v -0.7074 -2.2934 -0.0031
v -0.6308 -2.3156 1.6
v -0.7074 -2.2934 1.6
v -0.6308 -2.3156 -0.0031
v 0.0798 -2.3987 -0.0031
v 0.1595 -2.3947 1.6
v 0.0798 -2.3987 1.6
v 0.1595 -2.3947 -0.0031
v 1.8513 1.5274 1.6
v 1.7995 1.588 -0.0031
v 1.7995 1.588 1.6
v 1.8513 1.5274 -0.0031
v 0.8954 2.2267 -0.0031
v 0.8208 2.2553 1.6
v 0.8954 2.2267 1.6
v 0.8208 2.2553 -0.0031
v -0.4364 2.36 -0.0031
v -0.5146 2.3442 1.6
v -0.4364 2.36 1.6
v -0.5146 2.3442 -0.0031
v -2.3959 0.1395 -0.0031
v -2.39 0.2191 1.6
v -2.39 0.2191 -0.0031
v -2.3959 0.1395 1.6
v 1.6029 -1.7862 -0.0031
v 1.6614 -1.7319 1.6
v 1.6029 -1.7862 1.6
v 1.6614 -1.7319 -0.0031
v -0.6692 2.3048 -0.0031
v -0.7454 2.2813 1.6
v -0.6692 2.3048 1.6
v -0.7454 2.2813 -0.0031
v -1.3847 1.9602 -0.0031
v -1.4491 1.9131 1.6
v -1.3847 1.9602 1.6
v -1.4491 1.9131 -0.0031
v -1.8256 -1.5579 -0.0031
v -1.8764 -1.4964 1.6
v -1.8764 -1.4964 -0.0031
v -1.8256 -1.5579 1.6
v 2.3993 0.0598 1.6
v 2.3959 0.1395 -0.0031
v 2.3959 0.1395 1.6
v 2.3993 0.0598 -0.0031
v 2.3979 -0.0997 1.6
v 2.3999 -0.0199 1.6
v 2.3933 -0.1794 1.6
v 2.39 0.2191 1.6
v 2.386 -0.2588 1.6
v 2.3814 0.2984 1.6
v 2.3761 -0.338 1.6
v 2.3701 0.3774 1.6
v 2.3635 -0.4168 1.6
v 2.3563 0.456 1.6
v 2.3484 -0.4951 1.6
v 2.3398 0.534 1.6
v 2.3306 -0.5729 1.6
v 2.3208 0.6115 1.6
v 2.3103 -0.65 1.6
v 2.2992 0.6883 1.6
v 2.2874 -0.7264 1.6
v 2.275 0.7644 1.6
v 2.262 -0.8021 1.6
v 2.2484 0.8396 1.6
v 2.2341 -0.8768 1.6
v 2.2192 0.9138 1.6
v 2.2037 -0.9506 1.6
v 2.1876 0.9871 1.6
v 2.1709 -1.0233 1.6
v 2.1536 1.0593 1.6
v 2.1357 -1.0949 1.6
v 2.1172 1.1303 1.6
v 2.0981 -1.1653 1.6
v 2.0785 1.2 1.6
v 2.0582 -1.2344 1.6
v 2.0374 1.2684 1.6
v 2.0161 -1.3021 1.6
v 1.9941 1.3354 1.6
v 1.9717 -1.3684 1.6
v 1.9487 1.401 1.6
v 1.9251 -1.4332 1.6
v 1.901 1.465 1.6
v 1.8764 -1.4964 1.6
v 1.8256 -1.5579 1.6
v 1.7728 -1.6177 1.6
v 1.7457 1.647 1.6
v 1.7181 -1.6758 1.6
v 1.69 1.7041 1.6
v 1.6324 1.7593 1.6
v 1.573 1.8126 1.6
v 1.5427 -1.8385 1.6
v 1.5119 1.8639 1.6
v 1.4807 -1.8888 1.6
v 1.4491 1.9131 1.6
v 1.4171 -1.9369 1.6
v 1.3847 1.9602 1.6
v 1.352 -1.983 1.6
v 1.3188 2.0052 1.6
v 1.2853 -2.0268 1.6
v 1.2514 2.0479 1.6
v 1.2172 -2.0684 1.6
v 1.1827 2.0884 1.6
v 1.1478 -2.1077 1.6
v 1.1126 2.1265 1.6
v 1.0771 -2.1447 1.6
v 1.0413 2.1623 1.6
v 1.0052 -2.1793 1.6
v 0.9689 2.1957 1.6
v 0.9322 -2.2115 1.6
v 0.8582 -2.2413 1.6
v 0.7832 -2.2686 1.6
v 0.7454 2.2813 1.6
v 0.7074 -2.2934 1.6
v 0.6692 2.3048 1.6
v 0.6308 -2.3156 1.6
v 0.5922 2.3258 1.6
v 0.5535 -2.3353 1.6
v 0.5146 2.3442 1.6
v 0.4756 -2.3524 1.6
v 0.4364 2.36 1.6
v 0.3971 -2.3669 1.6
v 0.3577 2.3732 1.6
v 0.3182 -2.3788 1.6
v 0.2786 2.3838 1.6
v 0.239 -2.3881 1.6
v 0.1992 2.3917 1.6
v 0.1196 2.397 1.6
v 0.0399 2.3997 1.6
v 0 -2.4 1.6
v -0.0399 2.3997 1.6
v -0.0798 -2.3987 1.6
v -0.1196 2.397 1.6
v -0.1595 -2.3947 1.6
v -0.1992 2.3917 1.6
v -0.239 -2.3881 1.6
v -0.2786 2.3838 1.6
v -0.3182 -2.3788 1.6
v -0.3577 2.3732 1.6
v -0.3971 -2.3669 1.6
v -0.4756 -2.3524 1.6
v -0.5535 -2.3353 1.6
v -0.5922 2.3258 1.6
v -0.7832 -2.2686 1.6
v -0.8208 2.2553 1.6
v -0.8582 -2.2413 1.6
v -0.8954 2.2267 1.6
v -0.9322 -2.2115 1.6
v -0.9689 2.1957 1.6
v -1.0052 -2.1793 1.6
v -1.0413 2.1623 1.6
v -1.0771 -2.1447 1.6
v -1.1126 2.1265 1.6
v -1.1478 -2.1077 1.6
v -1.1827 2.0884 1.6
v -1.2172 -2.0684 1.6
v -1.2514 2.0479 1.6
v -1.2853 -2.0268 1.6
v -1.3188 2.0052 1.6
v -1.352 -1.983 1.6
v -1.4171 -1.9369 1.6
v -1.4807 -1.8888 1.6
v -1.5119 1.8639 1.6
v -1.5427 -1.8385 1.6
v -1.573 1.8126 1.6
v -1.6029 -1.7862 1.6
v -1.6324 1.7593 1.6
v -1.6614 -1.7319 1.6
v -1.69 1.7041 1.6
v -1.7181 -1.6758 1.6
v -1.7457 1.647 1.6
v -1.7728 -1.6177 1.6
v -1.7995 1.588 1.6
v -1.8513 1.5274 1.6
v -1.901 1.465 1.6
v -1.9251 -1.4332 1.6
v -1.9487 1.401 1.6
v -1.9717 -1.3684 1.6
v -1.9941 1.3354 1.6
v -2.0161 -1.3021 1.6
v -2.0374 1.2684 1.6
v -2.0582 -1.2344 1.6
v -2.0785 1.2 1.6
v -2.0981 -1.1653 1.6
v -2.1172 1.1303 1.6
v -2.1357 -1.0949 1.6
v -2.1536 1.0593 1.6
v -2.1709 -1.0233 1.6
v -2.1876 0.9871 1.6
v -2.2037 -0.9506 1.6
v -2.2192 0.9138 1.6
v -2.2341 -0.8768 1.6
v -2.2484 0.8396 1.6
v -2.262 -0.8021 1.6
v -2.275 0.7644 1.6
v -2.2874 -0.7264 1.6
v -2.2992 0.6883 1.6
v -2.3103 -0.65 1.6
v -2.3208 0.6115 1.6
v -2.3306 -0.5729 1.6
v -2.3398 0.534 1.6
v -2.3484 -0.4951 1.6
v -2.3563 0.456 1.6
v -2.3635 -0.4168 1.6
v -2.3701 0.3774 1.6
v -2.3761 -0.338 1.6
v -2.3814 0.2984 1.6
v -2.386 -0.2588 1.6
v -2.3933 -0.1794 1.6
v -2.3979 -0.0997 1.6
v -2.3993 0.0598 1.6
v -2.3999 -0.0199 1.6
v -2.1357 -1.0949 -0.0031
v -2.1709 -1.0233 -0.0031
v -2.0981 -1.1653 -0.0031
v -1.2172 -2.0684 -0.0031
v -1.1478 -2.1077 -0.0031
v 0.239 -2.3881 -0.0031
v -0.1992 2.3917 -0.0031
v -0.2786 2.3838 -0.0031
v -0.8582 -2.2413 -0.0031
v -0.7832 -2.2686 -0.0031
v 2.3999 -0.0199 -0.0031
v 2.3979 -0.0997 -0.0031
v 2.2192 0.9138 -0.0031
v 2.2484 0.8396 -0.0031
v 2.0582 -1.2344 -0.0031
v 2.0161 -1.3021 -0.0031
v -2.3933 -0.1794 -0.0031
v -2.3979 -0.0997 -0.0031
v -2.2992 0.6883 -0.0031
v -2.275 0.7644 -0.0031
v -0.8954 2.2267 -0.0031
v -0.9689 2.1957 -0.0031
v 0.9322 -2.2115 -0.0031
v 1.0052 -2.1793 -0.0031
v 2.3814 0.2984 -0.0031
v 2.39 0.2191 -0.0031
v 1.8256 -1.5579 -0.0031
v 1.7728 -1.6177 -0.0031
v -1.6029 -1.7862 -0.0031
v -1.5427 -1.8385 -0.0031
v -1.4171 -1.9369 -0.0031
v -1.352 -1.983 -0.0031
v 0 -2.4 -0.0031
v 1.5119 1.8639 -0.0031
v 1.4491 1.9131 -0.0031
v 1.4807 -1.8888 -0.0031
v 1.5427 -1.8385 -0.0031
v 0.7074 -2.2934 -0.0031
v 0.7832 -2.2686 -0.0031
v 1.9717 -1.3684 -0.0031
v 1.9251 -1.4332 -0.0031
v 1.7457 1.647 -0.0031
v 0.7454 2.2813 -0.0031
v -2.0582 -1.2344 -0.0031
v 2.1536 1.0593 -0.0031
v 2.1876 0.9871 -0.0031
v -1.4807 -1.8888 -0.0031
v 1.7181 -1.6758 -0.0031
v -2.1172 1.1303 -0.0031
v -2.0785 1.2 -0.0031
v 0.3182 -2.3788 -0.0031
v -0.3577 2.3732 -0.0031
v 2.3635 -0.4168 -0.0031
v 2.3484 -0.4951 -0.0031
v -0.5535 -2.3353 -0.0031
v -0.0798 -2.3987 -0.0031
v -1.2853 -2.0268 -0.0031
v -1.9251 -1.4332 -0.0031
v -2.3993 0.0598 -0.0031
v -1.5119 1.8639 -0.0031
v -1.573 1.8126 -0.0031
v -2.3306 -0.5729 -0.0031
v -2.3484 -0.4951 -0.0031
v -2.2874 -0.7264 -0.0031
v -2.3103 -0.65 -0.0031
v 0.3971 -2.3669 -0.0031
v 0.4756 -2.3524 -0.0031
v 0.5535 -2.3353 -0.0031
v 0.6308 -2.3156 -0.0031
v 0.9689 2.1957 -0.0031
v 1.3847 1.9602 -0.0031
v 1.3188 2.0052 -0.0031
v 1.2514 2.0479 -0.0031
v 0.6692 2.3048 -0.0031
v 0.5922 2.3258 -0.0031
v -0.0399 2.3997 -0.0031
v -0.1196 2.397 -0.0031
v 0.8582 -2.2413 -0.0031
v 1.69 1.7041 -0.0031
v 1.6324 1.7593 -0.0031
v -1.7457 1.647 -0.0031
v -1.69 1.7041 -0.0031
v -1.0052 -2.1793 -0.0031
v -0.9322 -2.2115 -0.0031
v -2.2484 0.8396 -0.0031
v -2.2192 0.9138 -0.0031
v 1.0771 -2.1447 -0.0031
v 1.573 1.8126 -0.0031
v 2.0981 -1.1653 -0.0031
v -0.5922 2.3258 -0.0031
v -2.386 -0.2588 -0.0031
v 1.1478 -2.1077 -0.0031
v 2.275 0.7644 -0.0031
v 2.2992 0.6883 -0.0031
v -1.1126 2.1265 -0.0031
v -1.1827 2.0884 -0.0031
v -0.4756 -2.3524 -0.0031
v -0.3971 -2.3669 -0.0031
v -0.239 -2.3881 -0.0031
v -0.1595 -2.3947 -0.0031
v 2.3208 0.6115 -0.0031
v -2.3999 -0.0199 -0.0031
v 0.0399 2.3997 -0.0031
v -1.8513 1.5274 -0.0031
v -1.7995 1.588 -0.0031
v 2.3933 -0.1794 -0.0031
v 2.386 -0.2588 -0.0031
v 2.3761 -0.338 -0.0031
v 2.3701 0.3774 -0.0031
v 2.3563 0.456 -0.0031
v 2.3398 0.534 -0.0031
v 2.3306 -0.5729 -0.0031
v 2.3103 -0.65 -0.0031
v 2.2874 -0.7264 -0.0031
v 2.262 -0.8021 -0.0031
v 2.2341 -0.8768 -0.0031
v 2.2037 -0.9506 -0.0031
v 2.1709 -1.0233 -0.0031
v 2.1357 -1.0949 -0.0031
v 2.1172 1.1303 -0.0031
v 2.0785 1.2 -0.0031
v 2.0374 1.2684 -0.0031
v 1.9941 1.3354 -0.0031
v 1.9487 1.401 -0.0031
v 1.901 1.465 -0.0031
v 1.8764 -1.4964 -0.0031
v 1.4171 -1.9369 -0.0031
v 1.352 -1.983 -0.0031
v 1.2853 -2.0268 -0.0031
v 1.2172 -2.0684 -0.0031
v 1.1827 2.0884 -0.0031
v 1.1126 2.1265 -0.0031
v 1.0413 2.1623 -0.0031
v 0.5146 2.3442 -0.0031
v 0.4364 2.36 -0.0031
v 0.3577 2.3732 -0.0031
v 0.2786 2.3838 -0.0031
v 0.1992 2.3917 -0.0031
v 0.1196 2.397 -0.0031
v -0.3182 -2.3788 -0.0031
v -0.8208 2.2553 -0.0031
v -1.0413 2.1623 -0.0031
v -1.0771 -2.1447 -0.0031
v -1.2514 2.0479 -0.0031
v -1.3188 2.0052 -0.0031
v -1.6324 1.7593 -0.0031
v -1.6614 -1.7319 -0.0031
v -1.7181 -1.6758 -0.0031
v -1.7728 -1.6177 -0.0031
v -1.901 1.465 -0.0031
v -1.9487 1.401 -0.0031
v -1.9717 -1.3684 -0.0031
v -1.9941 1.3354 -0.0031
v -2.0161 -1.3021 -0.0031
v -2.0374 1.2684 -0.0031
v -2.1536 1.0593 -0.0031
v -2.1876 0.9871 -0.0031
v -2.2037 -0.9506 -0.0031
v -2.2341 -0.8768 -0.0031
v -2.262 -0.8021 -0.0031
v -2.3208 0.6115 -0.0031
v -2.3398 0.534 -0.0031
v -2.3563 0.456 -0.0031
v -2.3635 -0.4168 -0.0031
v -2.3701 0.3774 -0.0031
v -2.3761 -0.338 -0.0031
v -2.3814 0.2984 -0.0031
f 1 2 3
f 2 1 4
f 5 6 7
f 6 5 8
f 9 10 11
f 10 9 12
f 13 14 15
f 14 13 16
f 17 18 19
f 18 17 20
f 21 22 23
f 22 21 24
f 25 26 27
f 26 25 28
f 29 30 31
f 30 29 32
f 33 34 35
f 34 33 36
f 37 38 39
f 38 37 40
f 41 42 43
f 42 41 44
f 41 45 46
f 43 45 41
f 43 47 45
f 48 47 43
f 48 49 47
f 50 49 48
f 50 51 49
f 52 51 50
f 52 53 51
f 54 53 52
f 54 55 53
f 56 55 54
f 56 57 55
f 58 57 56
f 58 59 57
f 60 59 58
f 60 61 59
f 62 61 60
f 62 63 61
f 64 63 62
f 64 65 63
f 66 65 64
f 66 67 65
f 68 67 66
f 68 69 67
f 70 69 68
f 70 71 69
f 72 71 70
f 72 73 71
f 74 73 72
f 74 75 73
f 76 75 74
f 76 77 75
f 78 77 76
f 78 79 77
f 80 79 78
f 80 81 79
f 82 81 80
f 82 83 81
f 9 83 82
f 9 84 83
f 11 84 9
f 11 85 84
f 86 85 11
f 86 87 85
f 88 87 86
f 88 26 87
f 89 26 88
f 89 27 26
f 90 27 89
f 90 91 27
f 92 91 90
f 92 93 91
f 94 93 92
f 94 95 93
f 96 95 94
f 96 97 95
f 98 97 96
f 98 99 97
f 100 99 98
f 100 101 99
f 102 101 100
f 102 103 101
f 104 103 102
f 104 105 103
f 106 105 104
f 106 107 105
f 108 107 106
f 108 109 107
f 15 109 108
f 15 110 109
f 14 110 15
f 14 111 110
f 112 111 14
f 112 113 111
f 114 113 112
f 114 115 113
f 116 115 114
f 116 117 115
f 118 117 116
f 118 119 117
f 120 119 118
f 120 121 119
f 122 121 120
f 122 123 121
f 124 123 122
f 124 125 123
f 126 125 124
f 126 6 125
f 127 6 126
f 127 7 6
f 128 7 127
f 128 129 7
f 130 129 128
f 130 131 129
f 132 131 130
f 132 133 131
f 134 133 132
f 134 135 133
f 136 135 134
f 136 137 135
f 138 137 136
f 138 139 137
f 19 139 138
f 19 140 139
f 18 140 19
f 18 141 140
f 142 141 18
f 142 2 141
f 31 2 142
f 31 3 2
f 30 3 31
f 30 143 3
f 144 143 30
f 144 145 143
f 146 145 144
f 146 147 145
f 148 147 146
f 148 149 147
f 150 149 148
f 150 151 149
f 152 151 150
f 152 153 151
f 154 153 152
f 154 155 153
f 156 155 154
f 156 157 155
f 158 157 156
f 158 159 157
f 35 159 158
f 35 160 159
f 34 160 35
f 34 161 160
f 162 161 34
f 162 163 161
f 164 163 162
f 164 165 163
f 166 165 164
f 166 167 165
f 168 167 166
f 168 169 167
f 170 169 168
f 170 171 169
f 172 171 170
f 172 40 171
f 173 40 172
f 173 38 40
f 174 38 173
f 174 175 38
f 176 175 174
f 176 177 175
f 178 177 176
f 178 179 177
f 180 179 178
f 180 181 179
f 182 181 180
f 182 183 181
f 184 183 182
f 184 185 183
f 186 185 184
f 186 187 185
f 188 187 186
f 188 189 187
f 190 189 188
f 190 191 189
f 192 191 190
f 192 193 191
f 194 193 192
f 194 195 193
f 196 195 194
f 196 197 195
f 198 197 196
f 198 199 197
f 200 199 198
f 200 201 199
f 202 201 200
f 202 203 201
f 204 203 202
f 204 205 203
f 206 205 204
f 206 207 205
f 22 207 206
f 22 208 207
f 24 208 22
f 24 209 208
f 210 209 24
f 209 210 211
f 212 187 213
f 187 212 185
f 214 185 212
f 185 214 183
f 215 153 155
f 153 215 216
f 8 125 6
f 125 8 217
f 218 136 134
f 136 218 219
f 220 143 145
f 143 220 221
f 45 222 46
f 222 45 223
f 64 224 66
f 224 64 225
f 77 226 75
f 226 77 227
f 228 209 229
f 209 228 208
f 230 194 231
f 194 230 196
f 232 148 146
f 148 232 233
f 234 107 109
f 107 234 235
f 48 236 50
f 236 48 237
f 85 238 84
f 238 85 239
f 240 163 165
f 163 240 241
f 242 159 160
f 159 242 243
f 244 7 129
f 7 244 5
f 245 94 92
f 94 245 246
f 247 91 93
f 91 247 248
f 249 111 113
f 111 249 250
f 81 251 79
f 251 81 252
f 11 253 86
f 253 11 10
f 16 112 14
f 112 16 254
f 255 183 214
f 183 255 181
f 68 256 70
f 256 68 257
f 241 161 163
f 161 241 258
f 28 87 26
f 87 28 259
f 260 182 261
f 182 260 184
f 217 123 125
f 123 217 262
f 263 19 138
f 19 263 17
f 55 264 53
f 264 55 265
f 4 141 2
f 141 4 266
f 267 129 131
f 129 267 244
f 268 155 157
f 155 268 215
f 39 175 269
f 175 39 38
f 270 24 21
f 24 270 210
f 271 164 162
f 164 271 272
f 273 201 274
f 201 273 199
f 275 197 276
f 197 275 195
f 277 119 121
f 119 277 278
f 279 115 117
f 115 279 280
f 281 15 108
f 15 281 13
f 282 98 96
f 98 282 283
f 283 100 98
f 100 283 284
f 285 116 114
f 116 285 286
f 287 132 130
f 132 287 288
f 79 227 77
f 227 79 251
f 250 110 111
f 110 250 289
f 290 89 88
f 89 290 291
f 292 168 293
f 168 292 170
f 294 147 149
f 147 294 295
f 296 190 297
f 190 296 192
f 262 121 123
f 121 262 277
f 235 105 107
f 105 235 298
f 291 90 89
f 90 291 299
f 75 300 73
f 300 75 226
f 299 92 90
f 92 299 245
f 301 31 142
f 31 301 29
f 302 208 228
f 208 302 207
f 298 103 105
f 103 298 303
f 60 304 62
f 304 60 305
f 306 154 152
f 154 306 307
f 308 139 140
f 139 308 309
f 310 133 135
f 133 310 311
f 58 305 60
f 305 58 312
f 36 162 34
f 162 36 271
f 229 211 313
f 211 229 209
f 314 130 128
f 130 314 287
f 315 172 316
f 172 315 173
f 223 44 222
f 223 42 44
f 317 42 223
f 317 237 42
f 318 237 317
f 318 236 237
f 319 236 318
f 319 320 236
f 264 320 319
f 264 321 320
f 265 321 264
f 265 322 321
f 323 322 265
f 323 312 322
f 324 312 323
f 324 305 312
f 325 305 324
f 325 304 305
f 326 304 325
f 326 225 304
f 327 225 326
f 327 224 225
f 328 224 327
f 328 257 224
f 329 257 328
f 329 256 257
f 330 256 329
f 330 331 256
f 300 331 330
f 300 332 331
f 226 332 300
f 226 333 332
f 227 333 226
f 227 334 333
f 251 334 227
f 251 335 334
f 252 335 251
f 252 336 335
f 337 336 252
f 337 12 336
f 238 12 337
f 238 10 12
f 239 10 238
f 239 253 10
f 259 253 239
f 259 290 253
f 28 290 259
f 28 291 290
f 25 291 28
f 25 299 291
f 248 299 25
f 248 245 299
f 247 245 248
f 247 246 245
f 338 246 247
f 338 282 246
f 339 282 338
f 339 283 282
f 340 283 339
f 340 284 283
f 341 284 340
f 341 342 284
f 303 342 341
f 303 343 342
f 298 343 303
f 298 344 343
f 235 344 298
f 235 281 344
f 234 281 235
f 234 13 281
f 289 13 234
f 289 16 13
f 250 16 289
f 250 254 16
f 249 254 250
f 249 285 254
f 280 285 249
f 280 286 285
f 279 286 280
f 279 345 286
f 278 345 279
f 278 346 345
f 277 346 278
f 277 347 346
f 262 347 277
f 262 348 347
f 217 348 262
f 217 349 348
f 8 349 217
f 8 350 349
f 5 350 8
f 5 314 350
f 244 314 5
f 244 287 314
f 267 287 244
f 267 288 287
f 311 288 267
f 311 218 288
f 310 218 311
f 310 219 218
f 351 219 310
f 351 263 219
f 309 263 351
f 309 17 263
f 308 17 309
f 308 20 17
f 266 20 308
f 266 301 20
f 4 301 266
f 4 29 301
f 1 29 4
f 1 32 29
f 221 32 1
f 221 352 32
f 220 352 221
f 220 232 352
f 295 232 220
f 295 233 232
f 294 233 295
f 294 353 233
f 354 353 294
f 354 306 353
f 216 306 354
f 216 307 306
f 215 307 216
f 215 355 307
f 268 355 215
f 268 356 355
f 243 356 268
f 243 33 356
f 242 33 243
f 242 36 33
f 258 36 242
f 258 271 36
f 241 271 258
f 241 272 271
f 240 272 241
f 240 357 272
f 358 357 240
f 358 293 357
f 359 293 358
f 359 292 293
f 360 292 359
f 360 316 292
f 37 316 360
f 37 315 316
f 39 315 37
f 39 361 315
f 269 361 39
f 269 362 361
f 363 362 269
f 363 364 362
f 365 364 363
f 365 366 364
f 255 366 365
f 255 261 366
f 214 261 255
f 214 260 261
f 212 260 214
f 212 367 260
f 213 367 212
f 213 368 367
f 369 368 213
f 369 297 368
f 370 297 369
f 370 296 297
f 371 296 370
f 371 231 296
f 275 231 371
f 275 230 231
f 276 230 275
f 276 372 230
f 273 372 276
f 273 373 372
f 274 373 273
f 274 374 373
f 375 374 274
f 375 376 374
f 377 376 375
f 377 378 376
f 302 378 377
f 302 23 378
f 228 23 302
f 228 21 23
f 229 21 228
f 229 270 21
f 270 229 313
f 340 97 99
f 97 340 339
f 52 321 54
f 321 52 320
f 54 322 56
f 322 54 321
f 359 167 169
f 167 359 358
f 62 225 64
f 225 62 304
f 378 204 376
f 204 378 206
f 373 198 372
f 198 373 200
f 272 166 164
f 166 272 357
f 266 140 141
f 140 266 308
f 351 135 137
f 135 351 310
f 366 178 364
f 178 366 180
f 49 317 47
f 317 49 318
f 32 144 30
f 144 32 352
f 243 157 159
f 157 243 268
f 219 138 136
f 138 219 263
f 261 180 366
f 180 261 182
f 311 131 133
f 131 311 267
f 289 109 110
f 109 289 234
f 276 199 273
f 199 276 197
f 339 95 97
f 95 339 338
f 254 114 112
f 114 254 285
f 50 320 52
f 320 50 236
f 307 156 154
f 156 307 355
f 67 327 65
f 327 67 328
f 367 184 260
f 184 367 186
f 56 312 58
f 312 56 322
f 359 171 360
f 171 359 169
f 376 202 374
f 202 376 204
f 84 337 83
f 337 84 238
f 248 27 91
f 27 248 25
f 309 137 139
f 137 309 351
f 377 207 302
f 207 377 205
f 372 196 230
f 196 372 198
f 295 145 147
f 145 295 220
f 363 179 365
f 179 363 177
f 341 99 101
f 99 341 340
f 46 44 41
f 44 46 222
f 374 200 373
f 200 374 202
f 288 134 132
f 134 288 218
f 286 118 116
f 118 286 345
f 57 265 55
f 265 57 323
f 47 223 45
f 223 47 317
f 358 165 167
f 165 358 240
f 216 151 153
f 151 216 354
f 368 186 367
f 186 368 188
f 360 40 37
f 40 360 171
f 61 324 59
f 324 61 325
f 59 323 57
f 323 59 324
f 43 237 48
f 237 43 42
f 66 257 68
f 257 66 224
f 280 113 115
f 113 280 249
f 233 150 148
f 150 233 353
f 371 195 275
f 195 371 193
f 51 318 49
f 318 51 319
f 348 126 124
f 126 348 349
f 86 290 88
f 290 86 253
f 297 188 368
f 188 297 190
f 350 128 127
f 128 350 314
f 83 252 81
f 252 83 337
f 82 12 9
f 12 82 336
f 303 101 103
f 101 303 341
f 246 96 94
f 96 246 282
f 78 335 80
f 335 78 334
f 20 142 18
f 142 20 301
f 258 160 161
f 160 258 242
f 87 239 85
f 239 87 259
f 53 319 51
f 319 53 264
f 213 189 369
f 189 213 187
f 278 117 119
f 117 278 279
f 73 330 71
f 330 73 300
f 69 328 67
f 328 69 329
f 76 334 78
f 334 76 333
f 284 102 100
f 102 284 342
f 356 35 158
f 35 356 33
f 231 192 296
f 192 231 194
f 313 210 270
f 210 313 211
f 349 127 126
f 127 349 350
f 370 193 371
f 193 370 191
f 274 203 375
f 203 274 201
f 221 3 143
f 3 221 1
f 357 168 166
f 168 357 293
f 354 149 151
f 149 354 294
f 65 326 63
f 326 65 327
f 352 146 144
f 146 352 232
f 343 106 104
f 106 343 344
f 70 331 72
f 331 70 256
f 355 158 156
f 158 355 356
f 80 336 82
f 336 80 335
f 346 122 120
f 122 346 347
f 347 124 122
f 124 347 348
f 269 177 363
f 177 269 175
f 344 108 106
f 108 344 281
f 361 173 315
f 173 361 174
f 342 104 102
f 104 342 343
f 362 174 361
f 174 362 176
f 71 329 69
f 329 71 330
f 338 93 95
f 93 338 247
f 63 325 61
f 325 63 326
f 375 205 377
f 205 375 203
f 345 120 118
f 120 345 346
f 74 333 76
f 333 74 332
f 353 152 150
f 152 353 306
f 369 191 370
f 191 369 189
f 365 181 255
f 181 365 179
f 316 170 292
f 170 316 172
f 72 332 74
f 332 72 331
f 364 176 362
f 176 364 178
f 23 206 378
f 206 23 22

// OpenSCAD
use <../lib.scad>
use <s/3960ps5s01.scad>
use <s/3960ps5s02.scad>
use <s/3960ps5s03.scad>
use <s/3960s01.scad>
use <s/3960s05.scad>
$fa=1; $fs=0.2;
function ldraw_lib__3960ps6(realsolid=false) = [
// 0 Dish  4 x  4 Inverted with SW Kessel Run Millennium Falcon Cockpit Pattern
// 0 Name: 3960ps6.dat
// 0 Author: Gerald Lasser [GeraldLasser]
// 0 !LDRAW_ORG Part UPDATE 2020-03
// 0 !LICENSE Licensed under CC BY 2.0 and CC BY 4.0 : see CAreadme.txt
// 
// 0 BFC CERTIFY CCW
  [0,"BFC","CERTIFY"],
  [0,"BFC","CCW"],
// 
// 0 !KEYWORDS Bricklink 3960pb050
// 
// 0 !HISTORY 2020-06-28 [PTadmin] Official Update 2020-01
// 0 !HISTORY 2020-10-04 [cwdee] Update description
// 0 !HISTORY 2020-12-29 [PTadmin] Official Update 2020-03
// 
// 
// 1 16 0 0 0 1 0 0 0 1 0 0 0 1 s\3960s01.dat
  [1,16,0,0,0,1,0,0,0,1,0,0,0,1, ldraw_lib__s__3960s01(realsolid)],
// 
// 1 15 0 0 0 1 0 0 0 1 0 0 0 1 s\3960ps5s01.dat
  [1,15,0,0,0,1,0,0,0,1,0,0,0,1, ldraw_lib__s__3960ps5s01(realsolid)],
// 1 71 0 0 0 1 0 0 0 1 0 0 0 1 s\3960ps5s02.dat
  [1,71,0,0,0,1,0,0,0,1,0,0,0,1, ldraw_lib__s__3960ps5s02(realsolid)],
// 1 16 0 0 0 1 0 0 0 1 0 0 0 1 s\3960ps5s03.dat
  [1,16,0,0,0,1,0,0,0,1,0,0,0,1, ldraw_lib__s__3960ps5s03(realsolid)],
// 
// 1 15 0 0 0 -1 0 0 0 1 0 0 0 1 s\3960ps5s01.dat
  [1,15,0,0,0,-1,0,0,0,1,0,0,0,1, ldraw_lib__s__3960ps5s01(realsolid)],
// 1 71 0 0 0 -1 0 0 0 1 0 0 0 1 s\3960ps5s02.dat
  [1,71,0,0,0,-1,0,0,0,1,0,0,0,1, ldraw_lib__s__3960ps5s02(realsolid)],
// 1 16 0 0 0 -1 0 0 0 1 0 0 0 1 s\3960ps5s03.dat
  [1,16,0,0,0,-1,0,0,0,1,0,0,0,1, ldraw_lib__s__3960ps5s03(realsolid)],
// 
// 1 16 0 0 0 1 0 0 0 1 0 0 0 1 s\3960s05.dat
  [1,16,0,0,0,1,0,0,0,1,0,0,0,1, ldraw_lib__s__3960s05(realsolid)],
// 
// 4 71 16.18441 1.73313 -12.41873 14.42498 1.73337 -14.42498 15.5562 2 -15.5562 16.12323 1.8999 -14.00191
  [4,71,16.18441,1.73313,-12.41873,14.42498,1.73337,-14.42498,15.5562,2,-15.5562,16.12323,1.8999,-14.00191],
// 3 71 16.18441 1.73313 -12.41873 16.12323 1.8999 -14.00191 16.97776 1.89978 -13.02749
  [3,71,16.18441,1.73313,-12.41873,16.12323,1.8999,-14.00191,16.97776,1.89978,-13.02749],
// 3 71 16.12323 1.8999 -14.00191 15.5562 2 -15.5562 16.54791 2 -14.42659
  [3,71,16.12323,1.8999,-14.00191,15.5562,2,-15.5562,16.54791,2,-14.42659],
// 4 15 16.97776 1.89978 -13.02749 16.12323 1.8999 -14.00191 16.54791 2 -14.42659 17.4548 2 -13.3936
  [4,15,16.97776,1.89978,-13.02749,16.12323,1.8999,-14.00191,16.54791,2,-14.42659,17.4548,2,-13.3936],
// 4 71 16.54791 2 -14.42659 15.5562 2 -15.5562 20.85945 4 -20.85945 21.85116 4 -19.72984
  [4,71,16.54791,2,-14.42659,15.5562,2,-15.5562,20.85945,4,-20.85945,21.85116,4,-19.72984],
// 4 15 16.54791 2 -14.42659 21.85116 4 -19.72984 23.4053 4 -17.9596 17.4548 2 -13.3936
  [4,15,16.54791,2,-14.42659,21.85116,4,-19.72984,23.4053,4,-17.9596,17.4548,2,-13.3936],
// 4 71 21.85116 4 -19.72984 20.85945 4 -20.85945 24.7485 6 -24.7485 25.74021 6 -23.61889
  [4,71,21.85116,4,-19.72984,20.85945,4,-20.85945,24.7485,6,-24.7485,25.74021,6,-23.61889],
// 4 15 21.85116 4 -19.72984 25.74021 6 -23.61889 27.769 6 -21.308 23.4053 4 -17.9596
  [4,15,21.85116,4,-19.72984,25.74021,6,-23.61889,27.769,6,-21.308,23.4053,4,-17.9596],
// 4 71 24.7485 6 -24.7485 28.284 8 -28.284 29.27571 8 -27.15439 25.74021 6 -23.61889
  [4,71,24.7485,6,-24.7485,28.284,8,-28.284,29.27571,8,-27.15439,25.74021,6,-23.61889],
// 4 15 25.74021 6 -23.61889 29.27571 8 -27.15439 31.736 8 -24.352 27.769 6 -21.308
  [4,15,25.74021,6,-23.61889,29.27571,8,-27.15439,31.736,8,-24.352,27.769,6,-21.308],
// 4 71 2.66273 1.73349 -20.22548 0 1.73333 -20.4 0 1.9 -21.4 1.5 1.90009 -21.30168
  [4,71,2.66273,1.73349,-20.22548,0,1.73333,-20.4,0,1.9,-21.4,1.5,1.90009,-21.30168],
// 4 71 1.5 1.90009 -21.30168 1.5 2 -21.90115 2.871 2 -21.8108 2.66273 1.73349 -20.22548
  [4,71,1.5,1.90009,-21.30168,1.5,2,-21.90115,2.871,2,-21.8108,2.66273,1.73349,-20.22548],
// 4 15 0 1.9 -21.4 0 2 -22 1.5 2 -21.90115 1.5 1.90009 -21.30168
  [4,15,0,1.9,-21.4,0,2,-22,1.5,2,-21.90115,1.5,1.90009,-21.30168],
// 4 71 3.84975 4 -29.2463 2.871 2 -21.8108 1.5 2 -21.90115 1.5 4 -29.40115
  [4,71,3.84975,4,-29.2463,2.871,2,-21.8108,1.5,2,-21.90115,1.5,4,-29.40115],
// 4 15 0 2 -22 0 4 -29.5 1.5 4 -29.40115 1.5 2 -21.90115
  [4,15,0,2,-22,0,4,-29.5,1.5,4,-29.40115,1.5,2,-21.90115],
// 4 71 4.5675 6 -34.699 3.84975 4 -29.2463 1.5 4 -29.40115 1.5 6 -34.90115
  [4,71,4.5675,6,-34.699,3.84975,4,-29.2463,1.5,4,-29.40115,1.5,6,-34.90115],
// 4 15 0 4 -29.5 0 6 -35 1.5 6 -34.90115 1.5 4 -29.40115
  [4,15,0,4,-29.5,0,6,-35,1.5,6,-34.90115,1.5,4,-29.40115],
// 4 71 1.51948 8 -39.89987 5.22 8 -39.656 4.5675 6 -34.699 1.5 6 -34.90115
  [4,71,1.51948,8,-39.89987,5.22,8,-39.656,4.5675,6,-34.699,1.5,6,-34.90115],
// 4 15 0 6 -35 0 8 -40 1.51948 8 -39.89987 1.5 6 -34.90115
  [4,15,0,6,-35,0,8,-40,1.51948,8,-39.89987,1.5,6,-34.90115],
// 4 71 5.27991 1.73343 -19.70489 2.66273 1.73349 -20.22548 2.871 2 -21.8108 5.6936 2 -21.2498
  [4,71,5.27991,1.73343,-19.70489,2.66273,1.73349,-20.22548,2.871,2,-21.8108,5.6936,2,-21.2498],
// 4 71 7.6346 4 -28.49405 5.6936 2 -21.2498 2.871 2 -21.8108 3.84975 4 -29.2463
  [4,71,7.6346,4,-28.49405,5.6936,2,-21.2498,2.871,2,-21.8108,3.84975,4,-29.2463],
// 4 71 3.84975 4 -29.2463 4.5675 6 -34.699 9.058 6 -33.8065 7.6346 4 -28.49405
  [4,71,3.84975,4,-29.2463,4.5675,6,-34.699,9.058,6,-33.8065,7.6346,4,-28.49405],
// 4 71 4.5675 6 -34.699 5.22 8 -39.656 10.352 8 -38.636 9.058 6 -33.8065
  [4,71,4.5675,6,-34.699,5.22,8,-39.656,10.352,8,-38.636,9.058,6,-33.8065],
// 4 71 7.80674 1.73325 -18.84714 5.27991 1.73343 -19.70489 5.6936 2 -21.2498 8.4194 2 -20.3258
  [4,71,7.80674,1.73325,-18.84714,5.27991,1.73343,-19.70489,5.6936,2,-21.2498,8.4194,2,-20.3258],
// 4 71 11.28965 4 -27.25505 8.4194 2 -20.3258 5.6936 2 -21.2498 7.6346 4 -28.49405
  [4,71,11.28965,4,-27.25505,8.4194,2,-20.3258,5.6936,2,-21.2498,7.6346,4,-28.49405],
// 4 71 7.6346 4 -28.49405 9.058 6 -33.8065 13.3945 6 -32.3365 11.28965 4 -27.25505
  [4,71,7.6346,4,-28.49405,9.058,6,-33.8065,13.3945,6,-32.3365,11.28965,4,-27.25505],
// 4 71 9.058 6 -33.8065 10.352 8 -38.636 15.308 8 -36.956 13.3945 6 -32.3365
  [4,71,9.058,6,-33.8065,10.352,8,-38.636,15.308,8,-36.956,13.3945,6,-32.3365],
// 4 71 10.2 1.73341 -17.66692 7.80674 1.73325 -18.84714 8.4194 2 -20.3258 11 2 -19.052
  [4,71,10.2,1.73341,-17.66692,7.80674,1.73325,-18.84714,8.4194,2,-20.3258,11,2,-19.052],
// 4 71 11.28965 4 -27.25505 14.75 4 -25.547 11 2 -19.052 8.4194 2 -20.3258
  [4,71,11.28965,4,-27.25505,14.75,4,-25.547,11,2,-19.052,8.4194,2,-20.3258],
// 4 71 11.28965 4 -27.25505 13.3945 6 -32.3365 17.5 6 -30.31 14.75 4 -25.547
  [4,71,11.28965,4,-27.25505,13.3945,6,-32.3365,17.5,6,-30.31,14.75,4,-25.547],
// 4 71 13.3945 6 -32.3365 15.308 8 -36.956 20 8 -34.64 17.5 6 -30.31
  [4,71,13.3945,6,-32.3365,15.308,8,-36.956,20,8,-34.64,17.5,6,-30.31],
// 4 71 12.41873 1.73313 -16.18441 10.2 1.73341 -17.66692 11 2 -19.052 13.3936 2 -17.4548
  [4,71,12.41873,1.73313,-16.18441,10.2,1.73341,-17.66692,11,2,-19.052,13.3936,2,-17.4548],
// 4 71 11 2 -19.052 14.75 4 -25.547 17.9596 4 -23.4053 13.3936 2 -17.4548
  [4,71,11,2,-19.052,14.75,4,-25.547,17.9596,4,-23.4053,13.3936,2,-17.4548],
// 4 71 14.75 4 -25.547 17.5 6 -30.31 21.308 6 -27.769 17.9596 4 -23.4053
  [4,71,14.75,4,-25.547,17.5,6,-30.31,21.308,6,-27.769,17.9596,4,-23.4053],
// 4 71 17.5 6 -30.31 20 8 -34.64 24.352 8 -31.736 21.308 6 -27.769
  [4,71,17.5,6,-30.31,20,8,-34.64,24.352,8,-31.736,21.308,6,-27.769],
// 4 71 14.42498 1.73337 -14.42498 12.41873 1.73313 -16.18441 13.3936 2 -17.4548 15.5562 2 -15.5562
  [4,71,14.42498,1.73337,-14.42498,12.41873,1.73313,-16.18441,13.3936,2,-17.4548,15.5562,2,-15.5562],
// 4 71 13.3936 2 -17.4548 17.9596 4 -23.4053 20.85945 4 -20.85945 15.5562 2 -15.5562
  [4,71,13.3936,2,-17.4548,17.9596,4,-23.4053,20.85945,4,-20.85945,15.5562,2,-15.5562],
// 4 71 17.9596 4 -23.4053 21.308 6 -27.769 24.7485 6 -24.7485 20.85945 4 -20.85945
  [4,71,17.9596,4,-23.4053,21.308,6,-27.769,24.7485,6,-24.7485,20.85945,4,-20.85945],
// 4 71 21.308 6 -27.769 24.352 8 -31.736 28.284 8 -28.284 24.7485 6 -24.7485
  [4,71,21.308,6,-27.769,24.352,8,-31.736,28.284,8,-28.284,24.7485,6,-24.7485],
// 4 71 -14.42498 1.73337 -14.42498 -16.18441 1.73313 -12.41873 -16.97776 1.89978 -13.02749 -15.13209 1.90003 -15.13209
  [4,71,-14.42498,1.73337,-14.42498,-16.18441,1.73313,-12.41873,-16.97776,1.89978,-13.02749,-15.13209,1.90003,-15.13209],
// 4 15 -17.4548 2 -13.3936 -15.5562 2 -15.5562 -15.13209 1.90003 -15.13209 -16.97776 1.89978 -13.02749
  [4,15,-17.4548,2,-13.3936,-15.5562,2,-15.5562,-15.13209,1.90003,-15.13209,-16.97776,1.89978,-13.02749],
// 4 15 -23.4053 4 -17.9596 -20.85945 4 -20.85945 -15.5562 2 -15.5562 -17.4548 2 -13.3936
  [4,15,-23.4053,4,-17.9596,-20.85945,4,-20.85945,-15.5562,2,-15.5562,-17.4548,2,-13.3936],
// 4 15 -23.4053 4 -17.9596 -27.769 6 -21.308 -24.7485 6 -24.7485 -20.85945 4 -20.85945
  [4,15,-23.4053,4,-17.9596,-27.769,6,-21.308,-24.7485,6,-24.7485,-20.85945,4,-20.85945],
// 4 15 -31.736 8 -24.352 -28.284 8 -28.284 -24.7485 6 -24.7485 -27.769 6 -21.308
  [4,15,-31.736,8,-24.352,-28.284,8,-28.284,-24.7485,6,-24.7485,-27.769,6,-21.308],
// 4 71 0 1.73333 -20.4 -2.66273 1.73349 -20.22548 -2.79326 1.90017 -21.21692 0 1.9 -21.4
  [4,71,0,1.73333,-20.4,-2.66273,1.73349,-20.22548,-2.79326,1.90017,-21.21692,0,1.9,-21.4],
// 4 15 -2.79326 1.90017 -21.21692 -2.871 2 -21.8108 0 2 -22 0 1.9 -21.4
  [4,15,-2.79326,1.90017,-21.21692,-2.871,2,-21.8108,0,2,-22,0,1.9,-21.4],
// 4 15 -2.871 2 -21.8108 -3.84975 4 -29.2463 0 4 -29.5 0 2 -22
  [4,15,-2.871,2,-21.8108,-3.84975,4,-29.2463,0,4,-29.5,0,2,-22],
// 4 15 -3.84975 4 -29.2463 -4.5675 6 -34.699 0 6 -35 0 4 -29.5
  [4,15,-3.84975,4,-29.2463,-4.5675,6,-34.699,0,6,-35,0,4,-29.5],
// 4 15 0 6 -35 -4.5675 6 -34.699 -5.22 8 -39.656 0 8 -40
  [4,15,0,6,-35,-4.5675,6,-34.699,-5.22,8,-39.656,0,8,-40],
// 4 71 -2.66273 1.73349 -20.22548 -5.27991 1.73343 -19.70489 -5.53873 1.9001 -20.67081 -2.79326 1.90017 -21.21692
  [4,71,-2.66273,1.73349,-20.22548,-5.27991,1.73343,-19.70489,-5.53873,1.9001,-20.67081,-2.79326,1.90017,-21.21692],
// 4 15 -2.871 2 -21.8108 -2.79326 1.90017 -21.21692 -5.53873 1.9001 -20.67081 -5.6936 2 -21.2498
  [4,15,-2.871,2,-21.8108,-2.79326,1.90017,-21.21692,-5.53873,1.9001,-20.67081,-5.6936,2,-21.2498],
// 4 15 -7.6346 4 -28.49405 -3.84975 4 -29.2463 -2.871 2 -21.8108 -5.6936 2 -21.2498
  [4,15,-7.6346,4,-28.49405,-3.84975,4,-29.2463,-2.871,2,-21.8108,-5.6936,2,-21.2498],
// 4 15 -7.6346 4 -28.49405 -9.058 6 -33.8065 -4.5675 6 -34.699 -3.84975 4 -29.2463
  [4,15,-7.6346,4,-28.49405,-9.058,6,-33.8065,-4.5675,6,-34.699,-3.84975,4,-29.2463],
// 4 15 -9.058 6 -33.8065 -10.352 8 -38.636 -5.22 8 -39.656 -4.5675 6 -34.699
  [4,15,-9.058,6,-33.8065,-10.352,8,-38.636,-5.22,8,-39.656,-4.5675,6,-34.699],
// 4 71 -5.27991 1.73343 -19.70489 -7.80674 1.73325 -18.84714 -8.18943 1.89991 -19.77102 -5.53873 1.9001 -20.67081
  [4,71,-5.27991,1.73343,-19.70489,-7.80674,1.73325,-18.84714,-8.18943,1.89991,-19.77102,-5.53873,1.9001,-20.67081],
// 4 15 -8.4194 2 -20.3258 -5.6936 2 -21.2498 -5.53873 1.9001 -20.67081 -8.18943 1.89991 -19.77102
  [4,15,-8.4194,2,-20.3258,-5.6936,2,-21.2498,-5.53873,1.9001,-20.67081,-8.18943,1.89991,-19.77102],
// 4 15 -11.28965 4 -27.25505 -7.6346 4 -28.49405 -5.6936 2 -21.2498 -8.4194 2 -20.3258
  [4,15,-11.28965,4,-27.25505,-7.6346,4,-28.49405,-5.6936,2,-21.2498,-8.4194,2,-20.3258],
// 4 15 -11.28965 4 -27.25505 -13.3945 6 -32.3365 -9.058 6 -33.8065 -7.6346 4 -28.49405
  [4,15,-11.28965,4,-27.25505,-13.3945,6,-32.3365,-9.058,6,-33.8065,-7.6346,4,-28.49405],
// 4 15 -13.3945 6 -32.3365 -15.308 8 -36.956 -10.352 8 -38.636 -9.058 6 -33.8065
  [4,15,-13.3945,6,-32.3365,-15.308,8,-36.956,-10.352,8,-38.636,-9.058,6,-33.8065],
// 4 71 -7.80674 1.73325 -18.84714 -10.2 1.73341 -17.66692 -10.7 1.90008 -18.53294 -8.18943 1.89991 -19.77102
  [4,71,-7.80674,1.73325,-18.84714,-10.2,1.73341,-17.66692,-10.7,1.90008,-18.53294,-8.18943,1.89991,-19.77102],
// 4 15 -11 2 -19.052 -8.4194 2 -20.3258 -8.18943 1.89991 -19.77102 -10.7 1.90008 -18.53294
  [4,15,-11,2,-19.052,-8.4194,2,-20.3258,-8.18943,1.89991,-19.77102,-10.7,1.90008,-18.53294],
// 4 15 -11.28965 4 -27.25505 -8.4194 2 -20.3258 -11 2 -19.052 -14.75 4 -25.547
  [4,15,-11.28965,4,-27.25505,-8.4194,2,-20.3258,-11,2,-19.052,-14.75,4,-25.547],
// 4 15 -14.75 4 -25.547 -17.5 6 -30.31 -13.3945 6 -32.3365 -11.28965 4 -27.25505
  [4,15,-14.75,4,-25.547,-17.5,6,-30.31,-13.3945,6,-32.3365,-11.28965,4,-27.25505],
// 4 15 -17.5 6 -30.31 -20 8 -34.64 -15.308 8 -36.956 -13.3945 6 -32.3365
  [4,15,-17.5,6,-30.31,-20,8,-34.64,-15.308,8,-36.956,-13.3945,6,-32.3365],
// 4 71 -10.2 1.73341 -17.66692 -12.41873 1.73313 -16.18441 -13.02749 1.89978 -16.97776 -10.7 1.90008 -18.53294
  [4,71,-10.2,1.73341,-17.66692,-12.41873,1.73313,-16.18441,-13.02749,1.89978,-16.97776,-10.7,1.90008,-18.53294],
// 4 15 -13.3936 2 -17.4548 -11 2 -19.052 -10.7 1.90008 -18.53294 -13.02749 1.89978 -16.97776
  [4,15,-13.3936,2,-17.4548,-11,2,-19.052,-10.7,1.90008,-18.53294,-13.02749,1.89978,-16.97776],
// 4 15 -14.75 4 -25.547 -11 2 -19.052 -13.3936 2 -17.4548 -17.9596 4 -23.4053
  [4,15,-14.75,4,-25.547,-11,2,-19.052,-13.3936,2,-17.4548,-17.9596,4,-23.4053],
// 4 15 -17.9596 4 -23.4053 -21.308 6 -27.769 -17.5 6 -30.31 -14.75 4 -25.547
  [4,15,-17.9596,4,-23.4053,-21.308,6,-27.769,-17.5,6,-30.31,-14.75,4,-25.547],
// 4 15 -21.308 6 -27.769 -24.352 8 -31.736 -20 8 -34.64 -17.5 6 -30.31
  [4,15,-21.308,6,-27.769,-24.352,8,-31.736,-20,8,-34.64,-17.5,6,-30.31],
// 4 71 -12.41873 1.73313 -16.18441 -14.42498 1.73337 -14.42498 -15.13209 1.90003 -15.13209 -13.02749 1.89978 -16.97776
  [4,71,-12.41873,1.73313,-16.18441,-14.42498,1.73337,-14.42498,-15.13209,1.90003,-15.13209,-13.02749,1.89978,-16.97776],
// 4 15 -15.5562 2 -15.5562 -13.3936 2 -17.4548 -13.02749 1.89978 -16.97776 -15.13209 1.90003 -15.13209
  [4,15,-15.5562,2,-15.5562,-13.3936,2,-17.4548,-13.02749,1.89978,-16.97776,-15.13209,1.90003,-15.13209],
// 4 15 -20.85945 4 -20.85945 -17.9596 4 -23.4053 -13.3936 2 -17.4548 -15.5562 2 -15.5562
  [4,15,-20.85945,4,-20.85945,-17.9596,4,-23.4053,-13.3936,2,-17.4548,-15.5562,2,-15.5562],
// 4 15 -20.85945 4 -20.85945 -24.7485 6 -24.7485 -21.308 6 -27.769 -17.9596 4 -23.4053
  [4,15,-20.85945,4,-20.85945,-24.7485,6,-24.7485,-21.308,6,-27.769,-17.9596,4,-23.4053],
// 4 15 -24.7485 6 -24.7485 -28.284 8 -28.284 -24.352 8 -31.736 -21.308 6 -27.769
  [4,15,-24.7485,6,-24.7485,-28.284,8,-28.284,-24.352,8,-31.736,-21.308,6,-27.769],
];
module ldraw_lib__3960ps6(step=0, col=false, unit=2/5, alt=false, line=0.2, solid=!$preview)
    makepoly(ldraw_lib__3960ps6(solid), step=step, col=col, unit=unit, alt=alt, line=line, solid=solid);
ldraw_lib__3960ps6(line=0.2);
